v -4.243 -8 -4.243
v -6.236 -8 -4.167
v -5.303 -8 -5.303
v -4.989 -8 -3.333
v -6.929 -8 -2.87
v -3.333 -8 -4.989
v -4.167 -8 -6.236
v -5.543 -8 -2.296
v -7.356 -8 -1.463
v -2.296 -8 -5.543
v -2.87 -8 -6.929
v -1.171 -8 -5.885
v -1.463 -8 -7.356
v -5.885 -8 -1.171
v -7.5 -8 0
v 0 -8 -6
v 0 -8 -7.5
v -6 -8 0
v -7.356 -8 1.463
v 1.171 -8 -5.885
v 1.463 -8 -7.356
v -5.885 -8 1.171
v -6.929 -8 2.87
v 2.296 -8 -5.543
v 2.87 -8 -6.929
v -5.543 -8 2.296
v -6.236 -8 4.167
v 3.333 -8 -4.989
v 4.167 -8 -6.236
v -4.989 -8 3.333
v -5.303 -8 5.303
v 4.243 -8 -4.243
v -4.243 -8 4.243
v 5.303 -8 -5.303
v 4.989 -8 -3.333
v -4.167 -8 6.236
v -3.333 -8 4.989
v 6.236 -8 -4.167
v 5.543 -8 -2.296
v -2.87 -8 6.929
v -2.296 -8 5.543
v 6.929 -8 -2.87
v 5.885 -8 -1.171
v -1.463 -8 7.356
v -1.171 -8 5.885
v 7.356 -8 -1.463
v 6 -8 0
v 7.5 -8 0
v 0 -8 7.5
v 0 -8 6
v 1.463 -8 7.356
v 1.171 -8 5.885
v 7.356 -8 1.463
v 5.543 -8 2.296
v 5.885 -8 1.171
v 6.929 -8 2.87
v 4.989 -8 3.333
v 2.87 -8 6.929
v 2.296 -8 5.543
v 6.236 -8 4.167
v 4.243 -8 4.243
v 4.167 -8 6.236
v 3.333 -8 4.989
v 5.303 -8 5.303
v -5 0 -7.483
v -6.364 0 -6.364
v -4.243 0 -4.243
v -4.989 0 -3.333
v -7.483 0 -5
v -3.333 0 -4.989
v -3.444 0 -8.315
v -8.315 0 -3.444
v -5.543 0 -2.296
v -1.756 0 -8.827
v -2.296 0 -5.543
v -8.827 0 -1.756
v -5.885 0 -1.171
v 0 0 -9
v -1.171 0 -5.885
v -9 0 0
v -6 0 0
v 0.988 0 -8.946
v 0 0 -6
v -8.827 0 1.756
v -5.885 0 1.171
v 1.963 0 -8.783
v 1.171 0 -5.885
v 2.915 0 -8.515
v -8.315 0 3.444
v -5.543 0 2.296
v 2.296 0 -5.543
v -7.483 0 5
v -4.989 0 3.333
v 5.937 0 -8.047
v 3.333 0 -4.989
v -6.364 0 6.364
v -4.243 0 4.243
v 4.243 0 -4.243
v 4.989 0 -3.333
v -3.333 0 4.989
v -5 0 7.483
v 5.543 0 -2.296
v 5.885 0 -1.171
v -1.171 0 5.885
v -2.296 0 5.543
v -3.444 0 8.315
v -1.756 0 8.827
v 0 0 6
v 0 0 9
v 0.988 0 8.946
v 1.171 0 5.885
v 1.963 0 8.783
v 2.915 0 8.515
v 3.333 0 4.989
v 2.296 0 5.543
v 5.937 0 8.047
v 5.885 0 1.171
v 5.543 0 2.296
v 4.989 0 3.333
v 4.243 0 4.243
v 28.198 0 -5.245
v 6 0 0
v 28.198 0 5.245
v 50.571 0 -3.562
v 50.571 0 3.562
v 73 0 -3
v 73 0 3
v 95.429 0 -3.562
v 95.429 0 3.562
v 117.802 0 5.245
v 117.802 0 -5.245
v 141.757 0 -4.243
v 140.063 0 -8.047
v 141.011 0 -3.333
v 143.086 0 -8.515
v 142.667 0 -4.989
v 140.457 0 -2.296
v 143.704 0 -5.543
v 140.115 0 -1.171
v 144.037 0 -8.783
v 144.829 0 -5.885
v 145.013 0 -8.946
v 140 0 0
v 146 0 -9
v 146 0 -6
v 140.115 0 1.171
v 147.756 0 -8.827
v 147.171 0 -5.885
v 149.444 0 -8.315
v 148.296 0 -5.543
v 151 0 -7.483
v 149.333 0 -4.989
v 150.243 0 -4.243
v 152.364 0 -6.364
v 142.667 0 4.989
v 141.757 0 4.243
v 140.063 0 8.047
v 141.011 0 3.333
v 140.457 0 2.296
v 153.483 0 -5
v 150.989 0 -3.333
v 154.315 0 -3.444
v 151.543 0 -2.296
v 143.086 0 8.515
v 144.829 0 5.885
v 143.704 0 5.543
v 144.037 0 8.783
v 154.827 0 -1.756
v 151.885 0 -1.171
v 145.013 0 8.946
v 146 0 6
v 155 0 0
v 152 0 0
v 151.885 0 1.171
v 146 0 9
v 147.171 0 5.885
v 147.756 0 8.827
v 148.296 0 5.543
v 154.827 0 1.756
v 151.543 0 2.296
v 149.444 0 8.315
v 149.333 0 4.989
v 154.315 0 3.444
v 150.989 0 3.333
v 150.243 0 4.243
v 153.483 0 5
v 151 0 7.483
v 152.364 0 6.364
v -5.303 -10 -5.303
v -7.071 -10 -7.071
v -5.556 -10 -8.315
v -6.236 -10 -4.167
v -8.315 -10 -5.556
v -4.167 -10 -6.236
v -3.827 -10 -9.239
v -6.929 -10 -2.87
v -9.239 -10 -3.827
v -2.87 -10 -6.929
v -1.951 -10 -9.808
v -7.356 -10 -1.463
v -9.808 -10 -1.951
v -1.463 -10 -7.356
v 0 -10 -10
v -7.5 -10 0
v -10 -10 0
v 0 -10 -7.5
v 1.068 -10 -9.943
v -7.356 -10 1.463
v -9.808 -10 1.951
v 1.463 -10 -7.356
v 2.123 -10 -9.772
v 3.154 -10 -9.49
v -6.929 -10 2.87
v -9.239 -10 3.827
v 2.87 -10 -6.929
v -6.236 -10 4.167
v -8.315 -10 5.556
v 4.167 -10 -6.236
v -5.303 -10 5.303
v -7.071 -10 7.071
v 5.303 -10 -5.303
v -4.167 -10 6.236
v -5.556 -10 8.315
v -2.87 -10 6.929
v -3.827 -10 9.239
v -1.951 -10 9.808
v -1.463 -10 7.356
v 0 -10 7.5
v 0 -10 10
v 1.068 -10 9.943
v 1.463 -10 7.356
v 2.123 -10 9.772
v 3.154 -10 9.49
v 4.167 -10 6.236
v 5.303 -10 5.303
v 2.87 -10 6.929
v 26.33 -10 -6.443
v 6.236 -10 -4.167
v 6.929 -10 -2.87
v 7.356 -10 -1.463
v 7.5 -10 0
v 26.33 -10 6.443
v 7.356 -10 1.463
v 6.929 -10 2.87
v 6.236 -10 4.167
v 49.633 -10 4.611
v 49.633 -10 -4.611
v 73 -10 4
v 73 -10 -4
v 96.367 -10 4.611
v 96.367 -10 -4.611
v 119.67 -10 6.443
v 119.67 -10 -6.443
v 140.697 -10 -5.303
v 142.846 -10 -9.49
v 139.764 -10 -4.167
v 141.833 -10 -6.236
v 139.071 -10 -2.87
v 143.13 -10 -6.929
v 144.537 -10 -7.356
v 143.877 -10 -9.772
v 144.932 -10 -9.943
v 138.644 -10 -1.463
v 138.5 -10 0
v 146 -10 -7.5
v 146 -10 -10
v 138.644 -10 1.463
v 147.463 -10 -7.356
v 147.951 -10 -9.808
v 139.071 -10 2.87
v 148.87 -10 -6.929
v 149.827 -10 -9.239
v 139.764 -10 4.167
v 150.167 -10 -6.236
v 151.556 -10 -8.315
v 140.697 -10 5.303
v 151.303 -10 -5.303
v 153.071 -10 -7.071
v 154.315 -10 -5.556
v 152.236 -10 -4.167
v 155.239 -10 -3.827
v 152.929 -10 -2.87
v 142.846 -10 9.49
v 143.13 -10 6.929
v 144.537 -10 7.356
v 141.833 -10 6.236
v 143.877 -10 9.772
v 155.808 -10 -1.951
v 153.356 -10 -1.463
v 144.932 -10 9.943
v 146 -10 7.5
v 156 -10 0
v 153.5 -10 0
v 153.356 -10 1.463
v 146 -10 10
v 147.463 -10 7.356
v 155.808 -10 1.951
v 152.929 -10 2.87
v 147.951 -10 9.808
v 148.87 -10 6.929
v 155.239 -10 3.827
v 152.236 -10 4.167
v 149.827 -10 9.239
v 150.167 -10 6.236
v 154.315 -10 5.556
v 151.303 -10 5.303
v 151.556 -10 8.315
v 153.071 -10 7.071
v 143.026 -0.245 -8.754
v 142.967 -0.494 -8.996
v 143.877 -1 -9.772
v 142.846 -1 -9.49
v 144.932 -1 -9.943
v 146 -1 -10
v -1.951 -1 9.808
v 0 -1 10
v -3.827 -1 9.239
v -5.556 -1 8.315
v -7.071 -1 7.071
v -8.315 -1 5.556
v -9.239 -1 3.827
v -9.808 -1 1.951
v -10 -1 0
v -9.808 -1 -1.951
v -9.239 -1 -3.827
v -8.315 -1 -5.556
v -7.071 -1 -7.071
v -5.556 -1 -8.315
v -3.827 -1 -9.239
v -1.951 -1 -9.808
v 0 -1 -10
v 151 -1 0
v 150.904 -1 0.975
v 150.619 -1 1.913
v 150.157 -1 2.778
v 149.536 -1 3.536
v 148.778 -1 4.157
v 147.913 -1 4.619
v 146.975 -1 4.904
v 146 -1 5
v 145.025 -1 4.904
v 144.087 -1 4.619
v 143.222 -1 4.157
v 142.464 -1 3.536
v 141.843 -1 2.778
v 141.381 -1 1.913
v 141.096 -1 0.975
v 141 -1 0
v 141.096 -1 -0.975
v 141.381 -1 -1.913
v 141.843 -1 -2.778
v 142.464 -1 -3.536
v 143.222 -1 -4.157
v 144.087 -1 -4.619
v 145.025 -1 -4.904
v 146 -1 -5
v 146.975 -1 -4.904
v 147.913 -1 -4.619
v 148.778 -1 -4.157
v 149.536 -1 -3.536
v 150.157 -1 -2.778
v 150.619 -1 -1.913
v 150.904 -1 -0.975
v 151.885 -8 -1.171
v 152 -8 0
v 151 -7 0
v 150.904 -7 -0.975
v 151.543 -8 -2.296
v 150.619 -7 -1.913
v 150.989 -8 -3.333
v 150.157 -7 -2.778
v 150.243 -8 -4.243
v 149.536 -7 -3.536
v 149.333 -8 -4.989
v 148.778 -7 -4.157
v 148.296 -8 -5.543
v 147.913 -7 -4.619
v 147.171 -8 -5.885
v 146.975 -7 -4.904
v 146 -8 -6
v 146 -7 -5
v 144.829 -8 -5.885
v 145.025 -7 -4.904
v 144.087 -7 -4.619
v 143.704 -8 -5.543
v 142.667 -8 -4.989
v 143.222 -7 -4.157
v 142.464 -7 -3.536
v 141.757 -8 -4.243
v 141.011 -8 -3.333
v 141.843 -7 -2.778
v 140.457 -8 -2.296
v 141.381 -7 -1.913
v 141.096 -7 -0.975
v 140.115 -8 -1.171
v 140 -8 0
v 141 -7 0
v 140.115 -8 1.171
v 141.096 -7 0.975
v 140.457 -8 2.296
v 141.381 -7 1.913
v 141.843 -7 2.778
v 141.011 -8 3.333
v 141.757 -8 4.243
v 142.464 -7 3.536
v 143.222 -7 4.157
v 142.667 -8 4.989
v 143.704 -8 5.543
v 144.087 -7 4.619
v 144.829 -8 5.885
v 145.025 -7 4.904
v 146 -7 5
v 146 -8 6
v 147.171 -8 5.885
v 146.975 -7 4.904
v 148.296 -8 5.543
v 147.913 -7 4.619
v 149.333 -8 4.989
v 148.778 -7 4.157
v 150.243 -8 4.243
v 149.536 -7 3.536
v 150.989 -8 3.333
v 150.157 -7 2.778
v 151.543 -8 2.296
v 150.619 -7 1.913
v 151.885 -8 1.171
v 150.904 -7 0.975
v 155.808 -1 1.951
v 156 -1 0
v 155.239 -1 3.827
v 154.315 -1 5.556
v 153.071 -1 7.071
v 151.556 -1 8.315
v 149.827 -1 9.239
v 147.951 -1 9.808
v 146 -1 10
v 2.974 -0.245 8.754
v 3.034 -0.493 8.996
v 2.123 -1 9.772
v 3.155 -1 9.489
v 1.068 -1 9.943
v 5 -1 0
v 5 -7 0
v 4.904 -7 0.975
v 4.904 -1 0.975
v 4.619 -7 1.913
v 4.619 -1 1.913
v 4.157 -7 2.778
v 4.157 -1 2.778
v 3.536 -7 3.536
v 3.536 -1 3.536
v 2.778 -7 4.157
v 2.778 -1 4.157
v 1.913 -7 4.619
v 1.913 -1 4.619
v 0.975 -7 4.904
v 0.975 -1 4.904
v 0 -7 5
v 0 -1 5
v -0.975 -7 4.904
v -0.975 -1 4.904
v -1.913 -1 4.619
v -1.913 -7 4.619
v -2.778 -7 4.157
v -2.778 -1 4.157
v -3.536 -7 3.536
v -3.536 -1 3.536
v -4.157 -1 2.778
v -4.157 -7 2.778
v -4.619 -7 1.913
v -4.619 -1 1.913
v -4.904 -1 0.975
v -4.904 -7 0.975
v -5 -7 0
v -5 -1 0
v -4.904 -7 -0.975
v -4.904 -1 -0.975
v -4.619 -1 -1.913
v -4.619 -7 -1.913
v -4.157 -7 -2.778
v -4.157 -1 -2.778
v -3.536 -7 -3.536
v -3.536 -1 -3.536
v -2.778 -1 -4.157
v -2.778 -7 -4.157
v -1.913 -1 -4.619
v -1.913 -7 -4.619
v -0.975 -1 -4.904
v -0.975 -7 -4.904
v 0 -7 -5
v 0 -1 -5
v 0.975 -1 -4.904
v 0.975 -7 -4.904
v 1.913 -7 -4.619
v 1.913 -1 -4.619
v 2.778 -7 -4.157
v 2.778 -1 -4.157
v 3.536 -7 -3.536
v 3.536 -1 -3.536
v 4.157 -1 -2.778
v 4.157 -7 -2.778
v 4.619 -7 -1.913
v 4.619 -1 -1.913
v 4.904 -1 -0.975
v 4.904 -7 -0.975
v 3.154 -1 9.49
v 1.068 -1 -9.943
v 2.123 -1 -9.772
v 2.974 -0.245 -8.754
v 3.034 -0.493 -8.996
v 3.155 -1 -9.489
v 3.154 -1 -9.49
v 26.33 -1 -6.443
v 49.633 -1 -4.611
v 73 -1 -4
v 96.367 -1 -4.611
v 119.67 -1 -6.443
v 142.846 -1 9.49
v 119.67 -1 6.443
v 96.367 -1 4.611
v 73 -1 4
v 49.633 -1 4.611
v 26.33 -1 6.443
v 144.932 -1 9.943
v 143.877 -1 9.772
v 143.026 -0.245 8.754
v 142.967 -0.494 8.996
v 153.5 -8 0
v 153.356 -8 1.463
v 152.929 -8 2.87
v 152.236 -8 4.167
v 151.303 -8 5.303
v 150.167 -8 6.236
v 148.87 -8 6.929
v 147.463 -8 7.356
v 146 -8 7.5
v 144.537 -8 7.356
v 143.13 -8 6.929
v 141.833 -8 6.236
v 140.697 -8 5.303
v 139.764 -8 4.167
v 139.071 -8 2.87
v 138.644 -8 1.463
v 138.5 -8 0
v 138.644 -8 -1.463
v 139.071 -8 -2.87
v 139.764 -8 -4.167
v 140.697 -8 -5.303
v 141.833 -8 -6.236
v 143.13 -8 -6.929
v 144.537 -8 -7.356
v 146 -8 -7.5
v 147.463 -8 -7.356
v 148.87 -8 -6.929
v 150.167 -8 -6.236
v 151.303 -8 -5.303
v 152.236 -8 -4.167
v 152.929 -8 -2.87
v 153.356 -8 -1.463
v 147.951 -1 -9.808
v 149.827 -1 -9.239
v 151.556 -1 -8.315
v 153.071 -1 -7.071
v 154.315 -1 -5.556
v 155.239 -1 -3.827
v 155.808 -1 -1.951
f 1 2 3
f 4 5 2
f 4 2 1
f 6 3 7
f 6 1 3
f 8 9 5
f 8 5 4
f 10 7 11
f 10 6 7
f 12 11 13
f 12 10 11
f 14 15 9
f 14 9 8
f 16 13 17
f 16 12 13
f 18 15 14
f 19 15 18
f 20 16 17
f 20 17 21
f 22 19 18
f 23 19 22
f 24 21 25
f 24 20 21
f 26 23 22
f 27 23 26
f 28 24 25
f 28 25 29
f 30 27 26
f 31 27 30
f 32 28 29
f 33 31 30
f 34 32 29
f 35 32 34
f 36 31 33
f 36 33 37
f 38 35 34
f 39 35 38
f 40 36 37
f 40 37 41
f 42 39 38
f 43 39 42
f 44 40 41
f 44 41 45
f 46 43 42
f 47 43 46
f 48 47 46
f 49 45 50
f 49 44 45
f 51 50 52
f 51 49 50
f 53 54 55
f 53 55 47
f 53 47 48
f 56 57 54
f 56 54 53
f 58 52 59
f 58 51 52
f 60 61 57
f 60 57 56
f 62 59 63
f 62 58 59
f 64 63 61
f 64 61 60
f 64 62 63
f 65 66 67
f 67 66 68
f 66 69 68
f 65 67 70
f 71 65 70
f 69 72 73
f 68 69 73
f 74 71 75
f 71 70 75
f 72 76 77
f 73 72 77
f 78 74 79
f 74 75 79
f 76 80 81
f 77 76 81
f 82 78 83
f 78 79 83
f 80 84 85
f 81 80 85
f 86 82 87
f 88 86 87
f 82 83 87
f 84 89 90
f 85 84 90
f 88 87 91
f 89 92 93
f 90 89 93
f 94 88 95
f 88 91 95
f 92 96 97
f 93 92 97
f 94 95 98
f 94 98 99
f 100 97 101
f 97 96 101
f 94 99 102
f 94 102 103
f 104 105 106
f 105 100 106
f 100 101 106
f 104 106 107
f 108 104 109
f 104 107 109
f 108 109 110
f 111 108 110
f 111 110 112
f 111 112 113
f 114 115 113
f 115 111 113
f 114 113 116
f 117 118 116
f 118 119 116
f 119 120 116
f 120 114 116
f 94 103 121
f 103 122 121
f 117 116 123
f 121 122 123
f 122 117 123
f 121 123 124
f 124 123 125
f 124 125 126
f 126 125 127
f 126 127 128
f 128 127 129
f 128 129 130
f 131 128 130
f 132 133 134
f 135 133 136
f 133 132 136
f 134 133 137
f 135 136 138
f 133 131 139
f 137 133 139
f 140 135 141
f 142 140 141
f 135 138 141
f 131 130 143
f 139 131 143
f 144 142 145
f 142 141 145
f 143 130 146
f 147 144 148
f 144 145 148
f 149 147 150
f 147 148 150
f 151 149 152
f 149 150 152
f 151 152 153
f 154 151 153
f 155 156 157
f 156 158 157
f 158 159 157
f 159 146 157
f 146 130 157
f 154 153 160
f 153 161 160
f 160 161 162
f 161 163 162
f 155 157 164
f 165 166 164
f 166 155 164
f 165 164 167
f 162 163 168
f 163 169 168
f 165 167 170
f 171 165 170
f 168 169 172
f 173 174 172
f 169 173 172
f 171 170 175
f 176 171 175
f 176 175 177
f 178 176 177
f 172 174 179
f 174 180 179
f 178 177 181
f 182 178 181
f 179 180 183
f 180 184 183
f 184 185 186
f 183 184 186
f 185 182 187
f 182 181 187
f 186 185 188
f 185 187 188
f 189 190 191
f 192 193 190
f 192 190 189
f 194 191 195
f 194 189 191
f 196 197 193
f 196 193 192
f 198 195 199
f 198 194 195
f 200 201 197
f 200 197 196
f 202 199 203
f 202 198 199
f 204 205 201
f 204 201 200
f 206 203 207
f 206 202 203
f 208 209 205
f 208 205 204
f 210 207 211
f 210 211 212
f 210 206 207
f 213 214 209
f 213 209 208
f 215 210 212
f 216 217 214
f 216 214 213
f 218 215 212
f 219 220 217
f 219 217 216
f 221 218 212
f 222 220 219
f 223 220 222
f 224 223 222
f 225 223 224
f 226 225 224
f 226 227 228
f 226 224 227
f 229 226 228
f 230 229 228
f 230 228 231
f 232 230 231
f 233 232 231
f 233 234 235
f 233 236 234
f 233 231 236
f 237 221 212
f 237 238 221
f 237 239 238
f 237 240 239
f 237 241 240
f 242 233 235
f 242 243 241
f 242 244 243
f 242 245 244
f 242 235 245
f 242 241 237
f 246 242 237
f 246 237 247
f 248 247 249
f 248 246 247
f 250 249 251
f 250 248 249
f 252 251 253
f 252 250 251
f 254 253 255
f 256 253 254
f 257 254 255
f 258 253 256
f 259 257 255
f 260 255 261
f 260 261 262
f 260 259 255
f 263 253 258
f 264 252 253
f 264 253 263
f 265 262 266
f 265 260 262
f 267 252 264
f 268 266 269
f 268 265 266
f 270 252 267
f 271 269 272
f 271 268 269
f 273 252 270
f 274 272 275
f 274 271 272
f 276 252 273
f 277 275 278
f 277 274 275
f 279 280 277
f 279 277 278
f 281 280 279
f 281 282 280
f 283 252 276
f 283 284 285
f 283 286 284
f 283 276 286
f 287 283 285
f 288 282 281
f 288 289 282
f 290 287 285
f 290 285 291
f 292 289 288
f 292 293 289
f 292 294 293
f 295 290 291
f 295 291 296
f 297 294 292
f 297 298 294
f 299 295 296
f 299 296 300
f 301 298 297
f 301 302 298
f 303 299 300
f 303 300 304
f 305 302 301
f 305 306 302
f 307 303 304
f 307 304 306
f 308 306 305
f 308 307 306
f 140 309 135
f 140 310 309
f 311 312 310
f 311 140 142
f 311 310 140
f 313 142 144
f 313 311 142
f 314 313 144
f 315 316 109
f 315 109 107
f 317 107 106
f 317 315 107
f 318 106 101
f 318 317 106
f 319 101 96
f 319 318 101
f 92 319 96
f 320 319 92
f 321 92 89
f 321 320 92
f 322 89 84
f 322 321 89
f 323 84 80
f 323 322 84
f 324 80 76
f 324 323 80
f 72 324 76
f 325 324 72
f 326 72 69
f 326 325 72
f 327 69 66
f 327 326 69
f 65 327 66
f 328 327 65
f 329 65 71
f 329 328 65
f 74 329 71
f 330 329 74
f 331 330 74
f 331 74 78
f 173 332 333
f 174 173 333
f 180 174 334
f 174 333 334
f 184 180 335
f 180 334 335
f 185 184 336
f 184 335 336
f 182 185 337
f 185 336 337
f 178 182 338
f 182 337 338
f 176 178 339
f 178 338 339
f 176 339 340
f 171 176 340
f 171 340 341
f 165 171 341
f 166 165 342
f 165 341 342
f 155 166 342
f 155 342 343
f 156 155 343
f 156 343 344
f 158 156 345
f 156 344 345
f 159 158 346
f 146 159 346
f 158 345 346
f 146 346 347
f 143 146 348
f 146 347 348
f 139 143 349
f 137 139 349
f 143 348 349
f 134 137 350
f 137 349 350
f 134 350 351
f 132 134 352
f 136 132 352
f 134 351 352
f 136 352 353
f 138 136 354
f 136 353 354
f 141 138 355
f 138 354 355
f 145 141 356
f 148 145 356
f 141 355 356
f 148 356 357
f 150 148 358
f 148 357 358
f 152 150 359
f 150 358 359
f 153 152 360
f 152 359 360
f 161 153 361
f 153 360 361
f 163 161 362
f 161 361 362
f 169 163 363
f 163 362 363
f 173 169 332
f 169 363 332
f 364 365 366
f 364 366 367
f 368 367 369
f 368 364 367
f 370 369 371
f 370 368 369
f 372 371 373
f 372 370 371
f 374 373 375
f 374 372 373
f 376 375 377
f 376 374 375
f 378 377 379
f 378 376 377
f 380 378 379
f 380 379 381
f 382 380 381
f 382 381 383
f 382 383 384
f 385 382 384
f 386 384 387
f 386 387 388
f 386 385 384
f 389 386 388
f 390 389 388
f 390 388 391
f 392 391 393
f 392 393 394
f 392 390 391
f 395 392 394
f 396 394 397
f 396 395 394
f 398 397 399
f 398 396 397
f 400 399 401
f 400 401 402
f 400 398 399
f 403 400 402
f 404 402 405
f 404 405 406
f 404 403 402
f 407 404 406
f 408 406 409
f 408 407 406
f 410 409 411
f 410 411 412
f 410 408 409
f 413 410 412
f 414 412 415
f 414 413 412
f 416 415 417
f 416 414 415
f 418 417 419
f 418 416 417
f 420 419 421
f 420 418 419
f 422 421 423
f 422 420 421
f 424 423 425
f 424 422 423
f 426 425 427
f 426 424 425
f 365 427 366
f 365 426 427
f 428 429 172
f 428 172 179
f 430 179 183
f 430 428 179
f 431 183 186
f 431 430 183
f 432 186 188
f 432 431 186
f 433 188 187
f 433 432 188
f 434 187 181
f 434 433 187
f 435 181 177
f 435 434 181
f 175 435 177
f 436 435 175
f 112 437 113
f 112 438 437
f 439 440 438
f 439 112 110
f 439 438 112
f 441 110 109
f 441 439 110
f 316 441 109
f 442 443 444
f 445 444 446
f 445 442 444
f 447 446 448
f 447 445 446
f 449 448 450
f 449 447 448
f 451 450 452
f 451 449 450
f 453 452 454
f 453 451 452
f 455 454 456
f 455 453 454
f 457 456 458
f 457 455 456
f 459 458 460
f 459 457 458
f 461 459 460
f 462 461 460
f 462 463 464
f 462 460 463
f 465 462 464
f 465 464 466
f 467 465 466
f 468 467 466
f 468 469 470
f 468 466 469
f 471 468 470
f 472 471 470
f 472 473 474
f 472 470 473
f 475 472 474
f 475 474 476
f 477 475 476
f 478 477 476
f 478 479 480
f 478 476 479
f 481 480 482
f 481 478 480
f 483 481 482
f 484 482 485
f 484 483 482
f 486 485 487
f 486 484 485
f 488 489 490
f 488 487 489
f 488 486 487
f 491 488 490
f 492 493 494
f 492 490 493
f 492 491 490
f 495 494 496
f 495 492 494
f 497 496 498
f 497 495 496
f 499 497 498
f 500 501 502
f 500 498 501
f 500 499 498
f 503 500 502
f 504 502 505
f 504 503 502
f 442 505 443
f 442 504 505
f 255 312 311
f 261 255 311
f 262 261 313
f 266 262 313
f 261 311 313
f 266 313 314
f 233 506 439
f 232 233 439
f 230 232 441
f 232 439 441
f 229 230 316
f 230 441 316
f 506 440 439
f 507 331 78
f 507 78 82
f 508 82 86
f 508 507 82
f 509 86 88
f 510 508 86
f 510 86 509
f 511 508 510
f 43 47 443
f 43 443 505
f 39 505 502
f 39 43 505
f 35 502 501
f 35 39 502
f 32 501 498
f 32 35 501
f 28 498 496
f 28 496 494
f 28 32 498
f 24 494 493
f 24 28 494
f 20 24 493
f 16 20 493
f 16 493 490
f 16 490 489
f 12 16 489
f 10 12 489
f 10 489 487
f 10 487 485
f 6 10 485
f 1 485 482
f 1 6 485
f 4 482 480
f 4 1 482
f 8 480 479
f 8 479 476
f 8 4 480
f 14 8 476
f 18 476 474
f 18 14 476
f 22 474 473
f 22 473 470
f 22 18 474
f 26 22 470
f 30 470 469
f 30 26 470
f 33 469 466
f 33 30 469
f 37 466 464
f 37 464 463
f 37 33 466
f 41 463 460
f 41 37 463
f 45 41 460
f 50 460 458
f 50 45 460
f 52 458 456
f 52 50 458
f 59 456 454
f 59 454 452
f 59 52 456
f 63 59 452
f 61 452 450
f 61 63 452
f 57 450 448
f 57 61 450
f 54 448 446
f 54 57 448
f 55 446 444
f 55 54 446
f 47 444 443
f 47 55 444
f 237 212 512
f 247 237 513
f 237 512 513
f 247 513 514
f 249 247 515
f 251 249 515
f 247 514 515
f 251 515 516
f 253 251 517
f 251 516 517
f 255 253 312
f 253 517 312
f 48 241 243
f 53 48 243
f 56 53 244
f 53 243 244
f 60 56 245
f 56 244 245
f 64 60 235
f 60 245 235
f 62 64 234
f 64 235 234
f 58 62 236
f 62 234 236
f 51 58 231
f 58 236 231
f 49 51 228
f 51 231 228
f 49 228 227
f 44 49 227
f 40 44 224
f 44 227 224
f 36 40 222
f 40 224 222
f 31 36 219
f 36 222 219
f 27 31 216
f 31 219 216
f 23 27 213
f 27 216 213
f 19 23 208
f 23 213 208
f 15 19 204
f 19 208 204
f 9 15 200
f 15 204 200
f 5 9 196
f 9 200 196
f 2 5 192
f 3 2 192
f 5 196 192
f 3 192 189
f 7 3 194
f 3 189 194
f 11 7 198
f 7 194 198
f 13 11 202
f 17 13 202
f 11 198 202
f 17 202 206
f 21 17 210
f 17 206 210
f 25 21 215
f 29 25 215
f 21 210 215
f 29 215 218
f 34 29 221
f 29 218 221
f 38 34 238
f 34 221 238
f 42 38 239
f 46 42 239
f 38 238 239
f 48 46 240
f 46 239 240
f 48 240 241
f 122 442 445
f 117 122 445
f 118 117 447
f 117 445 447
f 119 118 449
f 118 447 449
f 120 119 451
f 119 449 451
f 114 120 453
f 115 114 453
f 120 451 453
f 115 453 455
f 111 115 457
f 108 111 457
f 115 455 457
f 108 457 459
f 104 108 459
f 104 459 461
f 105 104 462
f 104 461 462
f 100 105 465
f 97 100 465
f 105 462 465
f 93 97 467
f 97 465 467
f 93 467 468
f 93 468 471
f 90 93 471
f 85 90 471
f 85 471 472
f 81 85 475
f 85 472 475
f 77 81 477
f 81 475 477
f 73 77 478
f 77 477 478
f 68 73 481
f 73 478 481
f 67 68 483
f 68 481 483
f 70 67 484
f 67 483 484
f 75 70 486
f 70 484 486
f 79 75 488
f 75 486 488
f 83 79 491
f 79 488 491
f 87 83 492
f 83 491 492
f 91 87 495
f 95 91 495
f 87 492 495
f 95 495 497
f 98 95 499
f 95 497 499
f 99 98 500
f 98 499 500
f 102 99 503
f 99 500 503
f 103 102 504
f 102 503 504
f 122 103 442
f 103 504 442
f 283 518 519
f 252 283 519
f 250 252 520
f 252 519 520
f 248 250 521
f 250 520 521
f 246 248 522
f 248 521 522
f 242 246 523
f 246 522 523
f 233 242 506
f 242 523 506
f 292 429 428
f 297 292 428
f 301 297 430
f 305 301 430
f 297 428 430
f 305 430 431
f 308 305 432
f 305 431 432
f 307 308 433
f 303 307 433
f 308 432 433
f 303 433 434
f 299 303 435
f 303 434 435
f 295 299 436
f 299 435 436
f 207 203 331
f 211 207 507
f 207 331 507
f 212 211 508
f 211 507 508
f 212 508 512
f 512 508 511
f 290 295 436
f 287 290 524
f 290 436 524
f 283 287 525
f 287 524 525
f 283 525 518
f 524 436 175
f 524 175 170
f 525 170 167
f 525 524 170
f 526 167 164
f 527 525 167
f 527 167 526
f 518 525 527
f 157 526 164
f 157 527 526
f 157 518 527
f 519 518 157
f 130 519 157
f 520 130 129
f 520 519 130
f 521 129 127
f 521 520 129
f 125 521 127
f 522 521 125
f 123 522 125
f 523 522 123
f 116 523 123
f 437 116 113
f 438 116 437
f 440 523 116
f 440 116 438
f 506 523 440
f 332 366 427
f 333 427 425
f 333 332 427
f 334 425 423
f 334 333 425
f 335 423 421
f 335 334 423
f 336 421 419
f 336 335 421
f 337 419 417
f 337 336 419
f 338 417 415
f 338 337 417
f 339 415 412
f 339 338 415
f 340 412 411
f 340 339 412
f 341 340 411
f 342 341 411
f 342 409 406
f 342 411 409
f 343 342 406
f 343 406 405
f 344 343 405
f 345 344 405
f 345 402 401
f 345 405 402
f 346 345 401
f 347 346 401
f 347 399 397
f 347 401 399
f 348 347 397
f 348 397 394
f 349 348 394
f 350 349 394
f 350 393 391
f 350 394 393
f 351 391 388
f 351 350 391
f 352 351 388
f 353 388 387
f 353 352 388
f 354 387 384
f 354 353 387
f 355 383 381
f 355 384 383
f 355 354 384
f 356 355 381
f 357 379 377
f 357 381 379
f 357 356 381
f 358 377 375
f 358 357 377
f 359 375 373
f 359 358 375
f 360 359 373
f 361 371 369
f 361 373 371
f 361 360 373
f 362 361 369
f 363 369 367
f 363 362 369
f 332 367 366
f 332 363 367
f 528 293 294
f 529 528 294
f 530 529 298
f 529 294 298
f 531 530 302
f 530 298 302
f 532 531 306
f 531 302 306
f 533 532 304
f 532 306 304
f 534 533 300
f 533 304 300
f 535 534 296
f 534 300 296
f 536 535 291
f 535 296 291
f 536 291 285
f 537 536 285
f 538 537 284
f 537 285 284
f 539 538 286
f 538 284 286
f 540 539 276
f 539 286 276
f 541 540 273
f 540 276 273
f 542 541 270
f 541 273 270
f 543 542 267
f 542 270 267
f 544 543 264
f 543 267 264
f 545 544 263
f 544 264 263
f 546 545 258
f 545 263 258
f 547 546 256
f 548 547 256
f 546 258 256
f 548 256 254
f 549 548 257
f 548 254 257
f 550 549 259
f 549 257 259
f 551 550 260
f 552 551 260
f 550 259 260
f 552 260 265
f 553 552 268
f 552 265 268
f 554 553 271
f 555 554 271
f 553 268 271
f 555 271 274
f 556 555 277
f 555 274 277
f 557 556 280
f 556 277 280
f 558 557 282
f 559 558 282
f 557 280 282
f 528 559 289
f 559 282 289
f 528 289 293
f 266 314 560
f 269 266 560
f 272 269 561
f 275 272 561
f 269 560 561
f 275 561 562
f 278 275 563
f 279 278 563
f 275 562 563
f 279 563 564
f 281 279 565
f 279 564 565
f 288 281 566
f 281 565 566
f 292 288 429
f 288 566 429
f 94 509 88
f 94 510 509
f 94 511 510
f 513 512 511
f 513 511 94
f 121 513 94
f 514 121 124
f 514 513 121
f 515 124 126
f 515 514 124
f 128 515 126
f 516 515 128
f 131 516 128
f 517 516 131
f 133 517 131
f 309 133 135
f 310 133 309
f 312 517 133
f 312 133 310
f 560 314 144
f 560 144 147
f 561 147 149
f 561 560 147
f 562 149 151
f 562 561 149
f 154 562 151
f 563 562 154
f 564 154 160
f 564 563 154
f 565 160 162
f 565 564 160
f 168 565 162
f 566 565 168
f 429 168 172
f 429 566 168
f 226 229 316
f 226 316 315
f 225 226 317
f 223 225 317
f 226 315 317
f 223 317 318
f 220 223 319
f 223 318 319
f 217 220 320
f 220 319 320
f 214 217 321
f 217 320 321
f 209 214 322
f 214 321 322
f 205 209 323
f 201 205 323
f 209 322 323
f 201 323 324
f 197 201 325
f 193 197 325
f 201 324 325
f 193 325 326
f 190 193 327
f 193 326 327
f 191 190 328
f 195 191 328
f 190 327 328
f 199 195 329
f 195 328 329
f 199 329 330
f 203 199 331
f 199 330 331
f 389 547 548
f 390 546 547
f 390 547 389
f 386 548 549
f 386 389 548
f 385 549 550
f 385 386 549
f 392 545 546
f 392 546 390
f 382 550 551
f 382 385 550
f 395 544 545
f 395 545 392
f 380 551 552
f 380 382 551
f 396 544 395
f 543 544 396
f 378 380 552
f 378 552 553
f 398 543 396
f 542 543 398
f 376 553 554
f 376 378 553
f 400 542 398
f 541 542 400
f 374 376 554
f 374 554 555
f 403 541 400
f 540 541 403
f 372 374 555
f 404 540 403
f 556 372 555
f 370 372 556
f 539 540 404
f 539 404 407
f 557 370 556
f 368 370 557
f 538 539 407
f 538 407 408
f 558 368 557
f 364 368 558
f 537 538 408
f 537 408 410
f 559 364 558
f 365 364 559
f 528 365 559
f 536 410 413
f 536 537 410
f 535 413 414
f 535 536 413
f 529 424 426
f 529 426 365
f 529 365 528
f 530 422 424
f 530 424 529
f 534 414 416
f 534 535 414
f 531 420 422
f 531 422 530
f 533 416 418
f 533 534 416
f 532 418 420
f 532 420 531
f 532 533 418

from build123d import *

# Parameters (mm, degrees)
F0_R       = 5
F1_DEPTH   = 10
F2_R       = 7.5
F3_DEPTH   = 2
F4_C1_SIZE = 1
F4_C2_SIZE = 1
F4_C3_SIZE = 1
F4_C4_SIZE = 1
F4_C5_SIZE = 1
F4_C6_SIZE = 1
F4_C7_SIZE = 0.9999
F4_C8_SIZE = 1


# Not quite as in the source:
# - a fillet or chamfer is up to 0.001 mm smaller than in the source, because OpenCascade refuses the exact size


with BuildPart() as f1:
    # F0 (on Front) → F1 (new body)
    with BuildSketch(Plane.XZ):
        with BuildLine():
            ThreePointArc((3.1540486056, 9.4895720343), (1.5765683293, 9.7419684548), (0, 10))
            ThreePointArc((0, 10), (-10, 0), (0, -10))
            ThreePointArc((0, -10), (1.5765683293, -9.7419684548), (3.1540486056, -9.4895720343))
            ThreePointArc((3.1540486056, -9.4895720343), (8.1098855126, -5.8506202211), (10, 0))
            ThreePointArc((10, 0), (8.1098855126, 5.8506202211), (3.1540486056, 9.4895720343))
        make_face()
        Circle(F0_R, mode=Mode.SUBTRACT)
        with BuildLine():
            ThreePointArc((3.1540486056, 9.4895720343), (1.5975418081, 9.8715682731), (0, 10))
            ThreePointArc((0, 10), (1.5765683293, 9.7419684548), (3.1540486056, 9.4895720343))
        make_face()
        with BuildLine():
            ThreePointArc((3.1540486056, -9.4895720343), (1.5765683293, -9.7419684548), (0, -10))
            ThreePointArc((0, -10), (1.5975418081, -9.8715682731), (3.1540486056, -9.4895720343))
        make_face()
        with BuildLine():
            ThreePointArc((142.8459513944, 9.4895720343), (73, 4), (3.1540486056, 9.4895720343))
            ThreePointArc((3.1540486056, 9.4895720343), (8.1098855126, 5.8506202211), (10, 0))
            ThreePointArc((10, 0), (8.1098855126, -5.8506202211), (3.1540486056, -9.4895720343))
            ThreePointArc((3.1540486056, -9.4895720343), (73, -4), (142.8459513944, -9.4895720343))
            ThreePointArc((142.8459513944, -9.4895720343), (136, 0), (142.8459513944, 9.4895720343))
        make_face()
        with BuildLine():
            ThreePointArc((146, 10), (144.4234316707, 9.7419684548), (142.8459513944, 9.4895720343))
            ThreePointArc((142.8459513944, 9.4895720343), (136, 0), (142.8459513944, -9.4895720343))
            ThreePointArc((142.8459513944, -9.4895720343), (144.4234316707, -9.7419684548), (146, -10))
            ThreePointArc((146, -10), (153.0710678119, -7.0710678119), (156, 0))
            ThreePointArc((156, 0), (153.0710678119, 7.0710678119), (146, 10))
        make_face()
        with Locations((146, 0)):
            Circle(F0_R, mode=Mode.SUBTRACT)
        with BuildLine():
            ThreePointArc((146, 10), (144.4024581919, 9.8715682731), (142.8459513944, 9.4895720343))
            ThreePointArc((142.8459513944, 9.4895720343), (144.4234316707, 9.7419684548), (146, 10))
        make_face()
        with BuildLine():
            ThreePointArc((146, -10), (144.4234316707, -9.7419684548), (142.8459513944, -9.4895720343))
            ThreePointArc((142.8459513944, -9.4895720343), (144.4024581919, -9.8715682731), (146, -10))
        make_face()
    extrude(amount=F1_DEPTH)

    # F2 (on face) → F3 (cut)
    with BuildSketch(Plane.XZ.offset(10)):
        Circle(F2_R)
        with Locations((146, 0)):
            Circle(F2_R)
    extrude(amount=-F3_DEPTH, mode=Mode.SUBTRACT)

    # F4: chamfer of 1 on 8 edges, made by hand

    # F4_c1
    f4_c1_edges = [f1.edges().sort_by_distance(p)[0] for p in [
        (73, 0, -4),
    ]]
    chamfer(f4_c1_edges, length=F4_C1_SIZE)

    # F4_c2
    f4_c2_edges = [f1.edges().sort_by_distance(p)[0] for p in [
        (73, 0, 3.9999999999),
    ]]
    chamfer(f4_c2_edges, length=F4_C2_SIZE)

    # F4_c3
    f4_c3_edges = [f1.edges().sort_by_distance(p)[0] for p in [
        (-5, 0, 0),
    ]]
    chamfer(f4_c3_edges, length=F4_C3_SIZE)

    # F4_c4
    f4_c4_edges = [f1.edges().sort_by_distance(p)[0] for p in [
        (141, 0, 0),
    ]]
    chamfer(f4_c4_edges, length=F4_C4_SIZE)

    # F4_c5
    f4_c5_edges = [f1.edges().sort_by_distance(p)[0] for p in [
        (-5, -8, 0),
    ]]
    chamfer(f4_c5_edges, length=F4_C5_SIZE)

    # F4_c6
    f4_c6_edges = [f1.edges().sort_by_distance(p)[0] for p in [
        (141, -8, 0),
    ]]
    chamfer(f4_c6_edges, length=F4_C6_SIZE)

    # F4_c7 (size 1 in the source; OpenCascade refuses exactly that, so slightly less here)
    f4_c7_edges = [f1.edges().sort_by_distance(p)[0] for p in [
        (-10, 0, 0),
    ]]
    chamfer(f4_c7_edges, length=F4_C7_SIZE)

    # F4_c8
    f4_c8_edges = [f1.edges().sort_by_distance(p)[0] for p in [
        (156, 0, 0),
    ]]
    chamfer(f4_c8_edges, length=F4_C8_SIZE)


solid = f1.part
